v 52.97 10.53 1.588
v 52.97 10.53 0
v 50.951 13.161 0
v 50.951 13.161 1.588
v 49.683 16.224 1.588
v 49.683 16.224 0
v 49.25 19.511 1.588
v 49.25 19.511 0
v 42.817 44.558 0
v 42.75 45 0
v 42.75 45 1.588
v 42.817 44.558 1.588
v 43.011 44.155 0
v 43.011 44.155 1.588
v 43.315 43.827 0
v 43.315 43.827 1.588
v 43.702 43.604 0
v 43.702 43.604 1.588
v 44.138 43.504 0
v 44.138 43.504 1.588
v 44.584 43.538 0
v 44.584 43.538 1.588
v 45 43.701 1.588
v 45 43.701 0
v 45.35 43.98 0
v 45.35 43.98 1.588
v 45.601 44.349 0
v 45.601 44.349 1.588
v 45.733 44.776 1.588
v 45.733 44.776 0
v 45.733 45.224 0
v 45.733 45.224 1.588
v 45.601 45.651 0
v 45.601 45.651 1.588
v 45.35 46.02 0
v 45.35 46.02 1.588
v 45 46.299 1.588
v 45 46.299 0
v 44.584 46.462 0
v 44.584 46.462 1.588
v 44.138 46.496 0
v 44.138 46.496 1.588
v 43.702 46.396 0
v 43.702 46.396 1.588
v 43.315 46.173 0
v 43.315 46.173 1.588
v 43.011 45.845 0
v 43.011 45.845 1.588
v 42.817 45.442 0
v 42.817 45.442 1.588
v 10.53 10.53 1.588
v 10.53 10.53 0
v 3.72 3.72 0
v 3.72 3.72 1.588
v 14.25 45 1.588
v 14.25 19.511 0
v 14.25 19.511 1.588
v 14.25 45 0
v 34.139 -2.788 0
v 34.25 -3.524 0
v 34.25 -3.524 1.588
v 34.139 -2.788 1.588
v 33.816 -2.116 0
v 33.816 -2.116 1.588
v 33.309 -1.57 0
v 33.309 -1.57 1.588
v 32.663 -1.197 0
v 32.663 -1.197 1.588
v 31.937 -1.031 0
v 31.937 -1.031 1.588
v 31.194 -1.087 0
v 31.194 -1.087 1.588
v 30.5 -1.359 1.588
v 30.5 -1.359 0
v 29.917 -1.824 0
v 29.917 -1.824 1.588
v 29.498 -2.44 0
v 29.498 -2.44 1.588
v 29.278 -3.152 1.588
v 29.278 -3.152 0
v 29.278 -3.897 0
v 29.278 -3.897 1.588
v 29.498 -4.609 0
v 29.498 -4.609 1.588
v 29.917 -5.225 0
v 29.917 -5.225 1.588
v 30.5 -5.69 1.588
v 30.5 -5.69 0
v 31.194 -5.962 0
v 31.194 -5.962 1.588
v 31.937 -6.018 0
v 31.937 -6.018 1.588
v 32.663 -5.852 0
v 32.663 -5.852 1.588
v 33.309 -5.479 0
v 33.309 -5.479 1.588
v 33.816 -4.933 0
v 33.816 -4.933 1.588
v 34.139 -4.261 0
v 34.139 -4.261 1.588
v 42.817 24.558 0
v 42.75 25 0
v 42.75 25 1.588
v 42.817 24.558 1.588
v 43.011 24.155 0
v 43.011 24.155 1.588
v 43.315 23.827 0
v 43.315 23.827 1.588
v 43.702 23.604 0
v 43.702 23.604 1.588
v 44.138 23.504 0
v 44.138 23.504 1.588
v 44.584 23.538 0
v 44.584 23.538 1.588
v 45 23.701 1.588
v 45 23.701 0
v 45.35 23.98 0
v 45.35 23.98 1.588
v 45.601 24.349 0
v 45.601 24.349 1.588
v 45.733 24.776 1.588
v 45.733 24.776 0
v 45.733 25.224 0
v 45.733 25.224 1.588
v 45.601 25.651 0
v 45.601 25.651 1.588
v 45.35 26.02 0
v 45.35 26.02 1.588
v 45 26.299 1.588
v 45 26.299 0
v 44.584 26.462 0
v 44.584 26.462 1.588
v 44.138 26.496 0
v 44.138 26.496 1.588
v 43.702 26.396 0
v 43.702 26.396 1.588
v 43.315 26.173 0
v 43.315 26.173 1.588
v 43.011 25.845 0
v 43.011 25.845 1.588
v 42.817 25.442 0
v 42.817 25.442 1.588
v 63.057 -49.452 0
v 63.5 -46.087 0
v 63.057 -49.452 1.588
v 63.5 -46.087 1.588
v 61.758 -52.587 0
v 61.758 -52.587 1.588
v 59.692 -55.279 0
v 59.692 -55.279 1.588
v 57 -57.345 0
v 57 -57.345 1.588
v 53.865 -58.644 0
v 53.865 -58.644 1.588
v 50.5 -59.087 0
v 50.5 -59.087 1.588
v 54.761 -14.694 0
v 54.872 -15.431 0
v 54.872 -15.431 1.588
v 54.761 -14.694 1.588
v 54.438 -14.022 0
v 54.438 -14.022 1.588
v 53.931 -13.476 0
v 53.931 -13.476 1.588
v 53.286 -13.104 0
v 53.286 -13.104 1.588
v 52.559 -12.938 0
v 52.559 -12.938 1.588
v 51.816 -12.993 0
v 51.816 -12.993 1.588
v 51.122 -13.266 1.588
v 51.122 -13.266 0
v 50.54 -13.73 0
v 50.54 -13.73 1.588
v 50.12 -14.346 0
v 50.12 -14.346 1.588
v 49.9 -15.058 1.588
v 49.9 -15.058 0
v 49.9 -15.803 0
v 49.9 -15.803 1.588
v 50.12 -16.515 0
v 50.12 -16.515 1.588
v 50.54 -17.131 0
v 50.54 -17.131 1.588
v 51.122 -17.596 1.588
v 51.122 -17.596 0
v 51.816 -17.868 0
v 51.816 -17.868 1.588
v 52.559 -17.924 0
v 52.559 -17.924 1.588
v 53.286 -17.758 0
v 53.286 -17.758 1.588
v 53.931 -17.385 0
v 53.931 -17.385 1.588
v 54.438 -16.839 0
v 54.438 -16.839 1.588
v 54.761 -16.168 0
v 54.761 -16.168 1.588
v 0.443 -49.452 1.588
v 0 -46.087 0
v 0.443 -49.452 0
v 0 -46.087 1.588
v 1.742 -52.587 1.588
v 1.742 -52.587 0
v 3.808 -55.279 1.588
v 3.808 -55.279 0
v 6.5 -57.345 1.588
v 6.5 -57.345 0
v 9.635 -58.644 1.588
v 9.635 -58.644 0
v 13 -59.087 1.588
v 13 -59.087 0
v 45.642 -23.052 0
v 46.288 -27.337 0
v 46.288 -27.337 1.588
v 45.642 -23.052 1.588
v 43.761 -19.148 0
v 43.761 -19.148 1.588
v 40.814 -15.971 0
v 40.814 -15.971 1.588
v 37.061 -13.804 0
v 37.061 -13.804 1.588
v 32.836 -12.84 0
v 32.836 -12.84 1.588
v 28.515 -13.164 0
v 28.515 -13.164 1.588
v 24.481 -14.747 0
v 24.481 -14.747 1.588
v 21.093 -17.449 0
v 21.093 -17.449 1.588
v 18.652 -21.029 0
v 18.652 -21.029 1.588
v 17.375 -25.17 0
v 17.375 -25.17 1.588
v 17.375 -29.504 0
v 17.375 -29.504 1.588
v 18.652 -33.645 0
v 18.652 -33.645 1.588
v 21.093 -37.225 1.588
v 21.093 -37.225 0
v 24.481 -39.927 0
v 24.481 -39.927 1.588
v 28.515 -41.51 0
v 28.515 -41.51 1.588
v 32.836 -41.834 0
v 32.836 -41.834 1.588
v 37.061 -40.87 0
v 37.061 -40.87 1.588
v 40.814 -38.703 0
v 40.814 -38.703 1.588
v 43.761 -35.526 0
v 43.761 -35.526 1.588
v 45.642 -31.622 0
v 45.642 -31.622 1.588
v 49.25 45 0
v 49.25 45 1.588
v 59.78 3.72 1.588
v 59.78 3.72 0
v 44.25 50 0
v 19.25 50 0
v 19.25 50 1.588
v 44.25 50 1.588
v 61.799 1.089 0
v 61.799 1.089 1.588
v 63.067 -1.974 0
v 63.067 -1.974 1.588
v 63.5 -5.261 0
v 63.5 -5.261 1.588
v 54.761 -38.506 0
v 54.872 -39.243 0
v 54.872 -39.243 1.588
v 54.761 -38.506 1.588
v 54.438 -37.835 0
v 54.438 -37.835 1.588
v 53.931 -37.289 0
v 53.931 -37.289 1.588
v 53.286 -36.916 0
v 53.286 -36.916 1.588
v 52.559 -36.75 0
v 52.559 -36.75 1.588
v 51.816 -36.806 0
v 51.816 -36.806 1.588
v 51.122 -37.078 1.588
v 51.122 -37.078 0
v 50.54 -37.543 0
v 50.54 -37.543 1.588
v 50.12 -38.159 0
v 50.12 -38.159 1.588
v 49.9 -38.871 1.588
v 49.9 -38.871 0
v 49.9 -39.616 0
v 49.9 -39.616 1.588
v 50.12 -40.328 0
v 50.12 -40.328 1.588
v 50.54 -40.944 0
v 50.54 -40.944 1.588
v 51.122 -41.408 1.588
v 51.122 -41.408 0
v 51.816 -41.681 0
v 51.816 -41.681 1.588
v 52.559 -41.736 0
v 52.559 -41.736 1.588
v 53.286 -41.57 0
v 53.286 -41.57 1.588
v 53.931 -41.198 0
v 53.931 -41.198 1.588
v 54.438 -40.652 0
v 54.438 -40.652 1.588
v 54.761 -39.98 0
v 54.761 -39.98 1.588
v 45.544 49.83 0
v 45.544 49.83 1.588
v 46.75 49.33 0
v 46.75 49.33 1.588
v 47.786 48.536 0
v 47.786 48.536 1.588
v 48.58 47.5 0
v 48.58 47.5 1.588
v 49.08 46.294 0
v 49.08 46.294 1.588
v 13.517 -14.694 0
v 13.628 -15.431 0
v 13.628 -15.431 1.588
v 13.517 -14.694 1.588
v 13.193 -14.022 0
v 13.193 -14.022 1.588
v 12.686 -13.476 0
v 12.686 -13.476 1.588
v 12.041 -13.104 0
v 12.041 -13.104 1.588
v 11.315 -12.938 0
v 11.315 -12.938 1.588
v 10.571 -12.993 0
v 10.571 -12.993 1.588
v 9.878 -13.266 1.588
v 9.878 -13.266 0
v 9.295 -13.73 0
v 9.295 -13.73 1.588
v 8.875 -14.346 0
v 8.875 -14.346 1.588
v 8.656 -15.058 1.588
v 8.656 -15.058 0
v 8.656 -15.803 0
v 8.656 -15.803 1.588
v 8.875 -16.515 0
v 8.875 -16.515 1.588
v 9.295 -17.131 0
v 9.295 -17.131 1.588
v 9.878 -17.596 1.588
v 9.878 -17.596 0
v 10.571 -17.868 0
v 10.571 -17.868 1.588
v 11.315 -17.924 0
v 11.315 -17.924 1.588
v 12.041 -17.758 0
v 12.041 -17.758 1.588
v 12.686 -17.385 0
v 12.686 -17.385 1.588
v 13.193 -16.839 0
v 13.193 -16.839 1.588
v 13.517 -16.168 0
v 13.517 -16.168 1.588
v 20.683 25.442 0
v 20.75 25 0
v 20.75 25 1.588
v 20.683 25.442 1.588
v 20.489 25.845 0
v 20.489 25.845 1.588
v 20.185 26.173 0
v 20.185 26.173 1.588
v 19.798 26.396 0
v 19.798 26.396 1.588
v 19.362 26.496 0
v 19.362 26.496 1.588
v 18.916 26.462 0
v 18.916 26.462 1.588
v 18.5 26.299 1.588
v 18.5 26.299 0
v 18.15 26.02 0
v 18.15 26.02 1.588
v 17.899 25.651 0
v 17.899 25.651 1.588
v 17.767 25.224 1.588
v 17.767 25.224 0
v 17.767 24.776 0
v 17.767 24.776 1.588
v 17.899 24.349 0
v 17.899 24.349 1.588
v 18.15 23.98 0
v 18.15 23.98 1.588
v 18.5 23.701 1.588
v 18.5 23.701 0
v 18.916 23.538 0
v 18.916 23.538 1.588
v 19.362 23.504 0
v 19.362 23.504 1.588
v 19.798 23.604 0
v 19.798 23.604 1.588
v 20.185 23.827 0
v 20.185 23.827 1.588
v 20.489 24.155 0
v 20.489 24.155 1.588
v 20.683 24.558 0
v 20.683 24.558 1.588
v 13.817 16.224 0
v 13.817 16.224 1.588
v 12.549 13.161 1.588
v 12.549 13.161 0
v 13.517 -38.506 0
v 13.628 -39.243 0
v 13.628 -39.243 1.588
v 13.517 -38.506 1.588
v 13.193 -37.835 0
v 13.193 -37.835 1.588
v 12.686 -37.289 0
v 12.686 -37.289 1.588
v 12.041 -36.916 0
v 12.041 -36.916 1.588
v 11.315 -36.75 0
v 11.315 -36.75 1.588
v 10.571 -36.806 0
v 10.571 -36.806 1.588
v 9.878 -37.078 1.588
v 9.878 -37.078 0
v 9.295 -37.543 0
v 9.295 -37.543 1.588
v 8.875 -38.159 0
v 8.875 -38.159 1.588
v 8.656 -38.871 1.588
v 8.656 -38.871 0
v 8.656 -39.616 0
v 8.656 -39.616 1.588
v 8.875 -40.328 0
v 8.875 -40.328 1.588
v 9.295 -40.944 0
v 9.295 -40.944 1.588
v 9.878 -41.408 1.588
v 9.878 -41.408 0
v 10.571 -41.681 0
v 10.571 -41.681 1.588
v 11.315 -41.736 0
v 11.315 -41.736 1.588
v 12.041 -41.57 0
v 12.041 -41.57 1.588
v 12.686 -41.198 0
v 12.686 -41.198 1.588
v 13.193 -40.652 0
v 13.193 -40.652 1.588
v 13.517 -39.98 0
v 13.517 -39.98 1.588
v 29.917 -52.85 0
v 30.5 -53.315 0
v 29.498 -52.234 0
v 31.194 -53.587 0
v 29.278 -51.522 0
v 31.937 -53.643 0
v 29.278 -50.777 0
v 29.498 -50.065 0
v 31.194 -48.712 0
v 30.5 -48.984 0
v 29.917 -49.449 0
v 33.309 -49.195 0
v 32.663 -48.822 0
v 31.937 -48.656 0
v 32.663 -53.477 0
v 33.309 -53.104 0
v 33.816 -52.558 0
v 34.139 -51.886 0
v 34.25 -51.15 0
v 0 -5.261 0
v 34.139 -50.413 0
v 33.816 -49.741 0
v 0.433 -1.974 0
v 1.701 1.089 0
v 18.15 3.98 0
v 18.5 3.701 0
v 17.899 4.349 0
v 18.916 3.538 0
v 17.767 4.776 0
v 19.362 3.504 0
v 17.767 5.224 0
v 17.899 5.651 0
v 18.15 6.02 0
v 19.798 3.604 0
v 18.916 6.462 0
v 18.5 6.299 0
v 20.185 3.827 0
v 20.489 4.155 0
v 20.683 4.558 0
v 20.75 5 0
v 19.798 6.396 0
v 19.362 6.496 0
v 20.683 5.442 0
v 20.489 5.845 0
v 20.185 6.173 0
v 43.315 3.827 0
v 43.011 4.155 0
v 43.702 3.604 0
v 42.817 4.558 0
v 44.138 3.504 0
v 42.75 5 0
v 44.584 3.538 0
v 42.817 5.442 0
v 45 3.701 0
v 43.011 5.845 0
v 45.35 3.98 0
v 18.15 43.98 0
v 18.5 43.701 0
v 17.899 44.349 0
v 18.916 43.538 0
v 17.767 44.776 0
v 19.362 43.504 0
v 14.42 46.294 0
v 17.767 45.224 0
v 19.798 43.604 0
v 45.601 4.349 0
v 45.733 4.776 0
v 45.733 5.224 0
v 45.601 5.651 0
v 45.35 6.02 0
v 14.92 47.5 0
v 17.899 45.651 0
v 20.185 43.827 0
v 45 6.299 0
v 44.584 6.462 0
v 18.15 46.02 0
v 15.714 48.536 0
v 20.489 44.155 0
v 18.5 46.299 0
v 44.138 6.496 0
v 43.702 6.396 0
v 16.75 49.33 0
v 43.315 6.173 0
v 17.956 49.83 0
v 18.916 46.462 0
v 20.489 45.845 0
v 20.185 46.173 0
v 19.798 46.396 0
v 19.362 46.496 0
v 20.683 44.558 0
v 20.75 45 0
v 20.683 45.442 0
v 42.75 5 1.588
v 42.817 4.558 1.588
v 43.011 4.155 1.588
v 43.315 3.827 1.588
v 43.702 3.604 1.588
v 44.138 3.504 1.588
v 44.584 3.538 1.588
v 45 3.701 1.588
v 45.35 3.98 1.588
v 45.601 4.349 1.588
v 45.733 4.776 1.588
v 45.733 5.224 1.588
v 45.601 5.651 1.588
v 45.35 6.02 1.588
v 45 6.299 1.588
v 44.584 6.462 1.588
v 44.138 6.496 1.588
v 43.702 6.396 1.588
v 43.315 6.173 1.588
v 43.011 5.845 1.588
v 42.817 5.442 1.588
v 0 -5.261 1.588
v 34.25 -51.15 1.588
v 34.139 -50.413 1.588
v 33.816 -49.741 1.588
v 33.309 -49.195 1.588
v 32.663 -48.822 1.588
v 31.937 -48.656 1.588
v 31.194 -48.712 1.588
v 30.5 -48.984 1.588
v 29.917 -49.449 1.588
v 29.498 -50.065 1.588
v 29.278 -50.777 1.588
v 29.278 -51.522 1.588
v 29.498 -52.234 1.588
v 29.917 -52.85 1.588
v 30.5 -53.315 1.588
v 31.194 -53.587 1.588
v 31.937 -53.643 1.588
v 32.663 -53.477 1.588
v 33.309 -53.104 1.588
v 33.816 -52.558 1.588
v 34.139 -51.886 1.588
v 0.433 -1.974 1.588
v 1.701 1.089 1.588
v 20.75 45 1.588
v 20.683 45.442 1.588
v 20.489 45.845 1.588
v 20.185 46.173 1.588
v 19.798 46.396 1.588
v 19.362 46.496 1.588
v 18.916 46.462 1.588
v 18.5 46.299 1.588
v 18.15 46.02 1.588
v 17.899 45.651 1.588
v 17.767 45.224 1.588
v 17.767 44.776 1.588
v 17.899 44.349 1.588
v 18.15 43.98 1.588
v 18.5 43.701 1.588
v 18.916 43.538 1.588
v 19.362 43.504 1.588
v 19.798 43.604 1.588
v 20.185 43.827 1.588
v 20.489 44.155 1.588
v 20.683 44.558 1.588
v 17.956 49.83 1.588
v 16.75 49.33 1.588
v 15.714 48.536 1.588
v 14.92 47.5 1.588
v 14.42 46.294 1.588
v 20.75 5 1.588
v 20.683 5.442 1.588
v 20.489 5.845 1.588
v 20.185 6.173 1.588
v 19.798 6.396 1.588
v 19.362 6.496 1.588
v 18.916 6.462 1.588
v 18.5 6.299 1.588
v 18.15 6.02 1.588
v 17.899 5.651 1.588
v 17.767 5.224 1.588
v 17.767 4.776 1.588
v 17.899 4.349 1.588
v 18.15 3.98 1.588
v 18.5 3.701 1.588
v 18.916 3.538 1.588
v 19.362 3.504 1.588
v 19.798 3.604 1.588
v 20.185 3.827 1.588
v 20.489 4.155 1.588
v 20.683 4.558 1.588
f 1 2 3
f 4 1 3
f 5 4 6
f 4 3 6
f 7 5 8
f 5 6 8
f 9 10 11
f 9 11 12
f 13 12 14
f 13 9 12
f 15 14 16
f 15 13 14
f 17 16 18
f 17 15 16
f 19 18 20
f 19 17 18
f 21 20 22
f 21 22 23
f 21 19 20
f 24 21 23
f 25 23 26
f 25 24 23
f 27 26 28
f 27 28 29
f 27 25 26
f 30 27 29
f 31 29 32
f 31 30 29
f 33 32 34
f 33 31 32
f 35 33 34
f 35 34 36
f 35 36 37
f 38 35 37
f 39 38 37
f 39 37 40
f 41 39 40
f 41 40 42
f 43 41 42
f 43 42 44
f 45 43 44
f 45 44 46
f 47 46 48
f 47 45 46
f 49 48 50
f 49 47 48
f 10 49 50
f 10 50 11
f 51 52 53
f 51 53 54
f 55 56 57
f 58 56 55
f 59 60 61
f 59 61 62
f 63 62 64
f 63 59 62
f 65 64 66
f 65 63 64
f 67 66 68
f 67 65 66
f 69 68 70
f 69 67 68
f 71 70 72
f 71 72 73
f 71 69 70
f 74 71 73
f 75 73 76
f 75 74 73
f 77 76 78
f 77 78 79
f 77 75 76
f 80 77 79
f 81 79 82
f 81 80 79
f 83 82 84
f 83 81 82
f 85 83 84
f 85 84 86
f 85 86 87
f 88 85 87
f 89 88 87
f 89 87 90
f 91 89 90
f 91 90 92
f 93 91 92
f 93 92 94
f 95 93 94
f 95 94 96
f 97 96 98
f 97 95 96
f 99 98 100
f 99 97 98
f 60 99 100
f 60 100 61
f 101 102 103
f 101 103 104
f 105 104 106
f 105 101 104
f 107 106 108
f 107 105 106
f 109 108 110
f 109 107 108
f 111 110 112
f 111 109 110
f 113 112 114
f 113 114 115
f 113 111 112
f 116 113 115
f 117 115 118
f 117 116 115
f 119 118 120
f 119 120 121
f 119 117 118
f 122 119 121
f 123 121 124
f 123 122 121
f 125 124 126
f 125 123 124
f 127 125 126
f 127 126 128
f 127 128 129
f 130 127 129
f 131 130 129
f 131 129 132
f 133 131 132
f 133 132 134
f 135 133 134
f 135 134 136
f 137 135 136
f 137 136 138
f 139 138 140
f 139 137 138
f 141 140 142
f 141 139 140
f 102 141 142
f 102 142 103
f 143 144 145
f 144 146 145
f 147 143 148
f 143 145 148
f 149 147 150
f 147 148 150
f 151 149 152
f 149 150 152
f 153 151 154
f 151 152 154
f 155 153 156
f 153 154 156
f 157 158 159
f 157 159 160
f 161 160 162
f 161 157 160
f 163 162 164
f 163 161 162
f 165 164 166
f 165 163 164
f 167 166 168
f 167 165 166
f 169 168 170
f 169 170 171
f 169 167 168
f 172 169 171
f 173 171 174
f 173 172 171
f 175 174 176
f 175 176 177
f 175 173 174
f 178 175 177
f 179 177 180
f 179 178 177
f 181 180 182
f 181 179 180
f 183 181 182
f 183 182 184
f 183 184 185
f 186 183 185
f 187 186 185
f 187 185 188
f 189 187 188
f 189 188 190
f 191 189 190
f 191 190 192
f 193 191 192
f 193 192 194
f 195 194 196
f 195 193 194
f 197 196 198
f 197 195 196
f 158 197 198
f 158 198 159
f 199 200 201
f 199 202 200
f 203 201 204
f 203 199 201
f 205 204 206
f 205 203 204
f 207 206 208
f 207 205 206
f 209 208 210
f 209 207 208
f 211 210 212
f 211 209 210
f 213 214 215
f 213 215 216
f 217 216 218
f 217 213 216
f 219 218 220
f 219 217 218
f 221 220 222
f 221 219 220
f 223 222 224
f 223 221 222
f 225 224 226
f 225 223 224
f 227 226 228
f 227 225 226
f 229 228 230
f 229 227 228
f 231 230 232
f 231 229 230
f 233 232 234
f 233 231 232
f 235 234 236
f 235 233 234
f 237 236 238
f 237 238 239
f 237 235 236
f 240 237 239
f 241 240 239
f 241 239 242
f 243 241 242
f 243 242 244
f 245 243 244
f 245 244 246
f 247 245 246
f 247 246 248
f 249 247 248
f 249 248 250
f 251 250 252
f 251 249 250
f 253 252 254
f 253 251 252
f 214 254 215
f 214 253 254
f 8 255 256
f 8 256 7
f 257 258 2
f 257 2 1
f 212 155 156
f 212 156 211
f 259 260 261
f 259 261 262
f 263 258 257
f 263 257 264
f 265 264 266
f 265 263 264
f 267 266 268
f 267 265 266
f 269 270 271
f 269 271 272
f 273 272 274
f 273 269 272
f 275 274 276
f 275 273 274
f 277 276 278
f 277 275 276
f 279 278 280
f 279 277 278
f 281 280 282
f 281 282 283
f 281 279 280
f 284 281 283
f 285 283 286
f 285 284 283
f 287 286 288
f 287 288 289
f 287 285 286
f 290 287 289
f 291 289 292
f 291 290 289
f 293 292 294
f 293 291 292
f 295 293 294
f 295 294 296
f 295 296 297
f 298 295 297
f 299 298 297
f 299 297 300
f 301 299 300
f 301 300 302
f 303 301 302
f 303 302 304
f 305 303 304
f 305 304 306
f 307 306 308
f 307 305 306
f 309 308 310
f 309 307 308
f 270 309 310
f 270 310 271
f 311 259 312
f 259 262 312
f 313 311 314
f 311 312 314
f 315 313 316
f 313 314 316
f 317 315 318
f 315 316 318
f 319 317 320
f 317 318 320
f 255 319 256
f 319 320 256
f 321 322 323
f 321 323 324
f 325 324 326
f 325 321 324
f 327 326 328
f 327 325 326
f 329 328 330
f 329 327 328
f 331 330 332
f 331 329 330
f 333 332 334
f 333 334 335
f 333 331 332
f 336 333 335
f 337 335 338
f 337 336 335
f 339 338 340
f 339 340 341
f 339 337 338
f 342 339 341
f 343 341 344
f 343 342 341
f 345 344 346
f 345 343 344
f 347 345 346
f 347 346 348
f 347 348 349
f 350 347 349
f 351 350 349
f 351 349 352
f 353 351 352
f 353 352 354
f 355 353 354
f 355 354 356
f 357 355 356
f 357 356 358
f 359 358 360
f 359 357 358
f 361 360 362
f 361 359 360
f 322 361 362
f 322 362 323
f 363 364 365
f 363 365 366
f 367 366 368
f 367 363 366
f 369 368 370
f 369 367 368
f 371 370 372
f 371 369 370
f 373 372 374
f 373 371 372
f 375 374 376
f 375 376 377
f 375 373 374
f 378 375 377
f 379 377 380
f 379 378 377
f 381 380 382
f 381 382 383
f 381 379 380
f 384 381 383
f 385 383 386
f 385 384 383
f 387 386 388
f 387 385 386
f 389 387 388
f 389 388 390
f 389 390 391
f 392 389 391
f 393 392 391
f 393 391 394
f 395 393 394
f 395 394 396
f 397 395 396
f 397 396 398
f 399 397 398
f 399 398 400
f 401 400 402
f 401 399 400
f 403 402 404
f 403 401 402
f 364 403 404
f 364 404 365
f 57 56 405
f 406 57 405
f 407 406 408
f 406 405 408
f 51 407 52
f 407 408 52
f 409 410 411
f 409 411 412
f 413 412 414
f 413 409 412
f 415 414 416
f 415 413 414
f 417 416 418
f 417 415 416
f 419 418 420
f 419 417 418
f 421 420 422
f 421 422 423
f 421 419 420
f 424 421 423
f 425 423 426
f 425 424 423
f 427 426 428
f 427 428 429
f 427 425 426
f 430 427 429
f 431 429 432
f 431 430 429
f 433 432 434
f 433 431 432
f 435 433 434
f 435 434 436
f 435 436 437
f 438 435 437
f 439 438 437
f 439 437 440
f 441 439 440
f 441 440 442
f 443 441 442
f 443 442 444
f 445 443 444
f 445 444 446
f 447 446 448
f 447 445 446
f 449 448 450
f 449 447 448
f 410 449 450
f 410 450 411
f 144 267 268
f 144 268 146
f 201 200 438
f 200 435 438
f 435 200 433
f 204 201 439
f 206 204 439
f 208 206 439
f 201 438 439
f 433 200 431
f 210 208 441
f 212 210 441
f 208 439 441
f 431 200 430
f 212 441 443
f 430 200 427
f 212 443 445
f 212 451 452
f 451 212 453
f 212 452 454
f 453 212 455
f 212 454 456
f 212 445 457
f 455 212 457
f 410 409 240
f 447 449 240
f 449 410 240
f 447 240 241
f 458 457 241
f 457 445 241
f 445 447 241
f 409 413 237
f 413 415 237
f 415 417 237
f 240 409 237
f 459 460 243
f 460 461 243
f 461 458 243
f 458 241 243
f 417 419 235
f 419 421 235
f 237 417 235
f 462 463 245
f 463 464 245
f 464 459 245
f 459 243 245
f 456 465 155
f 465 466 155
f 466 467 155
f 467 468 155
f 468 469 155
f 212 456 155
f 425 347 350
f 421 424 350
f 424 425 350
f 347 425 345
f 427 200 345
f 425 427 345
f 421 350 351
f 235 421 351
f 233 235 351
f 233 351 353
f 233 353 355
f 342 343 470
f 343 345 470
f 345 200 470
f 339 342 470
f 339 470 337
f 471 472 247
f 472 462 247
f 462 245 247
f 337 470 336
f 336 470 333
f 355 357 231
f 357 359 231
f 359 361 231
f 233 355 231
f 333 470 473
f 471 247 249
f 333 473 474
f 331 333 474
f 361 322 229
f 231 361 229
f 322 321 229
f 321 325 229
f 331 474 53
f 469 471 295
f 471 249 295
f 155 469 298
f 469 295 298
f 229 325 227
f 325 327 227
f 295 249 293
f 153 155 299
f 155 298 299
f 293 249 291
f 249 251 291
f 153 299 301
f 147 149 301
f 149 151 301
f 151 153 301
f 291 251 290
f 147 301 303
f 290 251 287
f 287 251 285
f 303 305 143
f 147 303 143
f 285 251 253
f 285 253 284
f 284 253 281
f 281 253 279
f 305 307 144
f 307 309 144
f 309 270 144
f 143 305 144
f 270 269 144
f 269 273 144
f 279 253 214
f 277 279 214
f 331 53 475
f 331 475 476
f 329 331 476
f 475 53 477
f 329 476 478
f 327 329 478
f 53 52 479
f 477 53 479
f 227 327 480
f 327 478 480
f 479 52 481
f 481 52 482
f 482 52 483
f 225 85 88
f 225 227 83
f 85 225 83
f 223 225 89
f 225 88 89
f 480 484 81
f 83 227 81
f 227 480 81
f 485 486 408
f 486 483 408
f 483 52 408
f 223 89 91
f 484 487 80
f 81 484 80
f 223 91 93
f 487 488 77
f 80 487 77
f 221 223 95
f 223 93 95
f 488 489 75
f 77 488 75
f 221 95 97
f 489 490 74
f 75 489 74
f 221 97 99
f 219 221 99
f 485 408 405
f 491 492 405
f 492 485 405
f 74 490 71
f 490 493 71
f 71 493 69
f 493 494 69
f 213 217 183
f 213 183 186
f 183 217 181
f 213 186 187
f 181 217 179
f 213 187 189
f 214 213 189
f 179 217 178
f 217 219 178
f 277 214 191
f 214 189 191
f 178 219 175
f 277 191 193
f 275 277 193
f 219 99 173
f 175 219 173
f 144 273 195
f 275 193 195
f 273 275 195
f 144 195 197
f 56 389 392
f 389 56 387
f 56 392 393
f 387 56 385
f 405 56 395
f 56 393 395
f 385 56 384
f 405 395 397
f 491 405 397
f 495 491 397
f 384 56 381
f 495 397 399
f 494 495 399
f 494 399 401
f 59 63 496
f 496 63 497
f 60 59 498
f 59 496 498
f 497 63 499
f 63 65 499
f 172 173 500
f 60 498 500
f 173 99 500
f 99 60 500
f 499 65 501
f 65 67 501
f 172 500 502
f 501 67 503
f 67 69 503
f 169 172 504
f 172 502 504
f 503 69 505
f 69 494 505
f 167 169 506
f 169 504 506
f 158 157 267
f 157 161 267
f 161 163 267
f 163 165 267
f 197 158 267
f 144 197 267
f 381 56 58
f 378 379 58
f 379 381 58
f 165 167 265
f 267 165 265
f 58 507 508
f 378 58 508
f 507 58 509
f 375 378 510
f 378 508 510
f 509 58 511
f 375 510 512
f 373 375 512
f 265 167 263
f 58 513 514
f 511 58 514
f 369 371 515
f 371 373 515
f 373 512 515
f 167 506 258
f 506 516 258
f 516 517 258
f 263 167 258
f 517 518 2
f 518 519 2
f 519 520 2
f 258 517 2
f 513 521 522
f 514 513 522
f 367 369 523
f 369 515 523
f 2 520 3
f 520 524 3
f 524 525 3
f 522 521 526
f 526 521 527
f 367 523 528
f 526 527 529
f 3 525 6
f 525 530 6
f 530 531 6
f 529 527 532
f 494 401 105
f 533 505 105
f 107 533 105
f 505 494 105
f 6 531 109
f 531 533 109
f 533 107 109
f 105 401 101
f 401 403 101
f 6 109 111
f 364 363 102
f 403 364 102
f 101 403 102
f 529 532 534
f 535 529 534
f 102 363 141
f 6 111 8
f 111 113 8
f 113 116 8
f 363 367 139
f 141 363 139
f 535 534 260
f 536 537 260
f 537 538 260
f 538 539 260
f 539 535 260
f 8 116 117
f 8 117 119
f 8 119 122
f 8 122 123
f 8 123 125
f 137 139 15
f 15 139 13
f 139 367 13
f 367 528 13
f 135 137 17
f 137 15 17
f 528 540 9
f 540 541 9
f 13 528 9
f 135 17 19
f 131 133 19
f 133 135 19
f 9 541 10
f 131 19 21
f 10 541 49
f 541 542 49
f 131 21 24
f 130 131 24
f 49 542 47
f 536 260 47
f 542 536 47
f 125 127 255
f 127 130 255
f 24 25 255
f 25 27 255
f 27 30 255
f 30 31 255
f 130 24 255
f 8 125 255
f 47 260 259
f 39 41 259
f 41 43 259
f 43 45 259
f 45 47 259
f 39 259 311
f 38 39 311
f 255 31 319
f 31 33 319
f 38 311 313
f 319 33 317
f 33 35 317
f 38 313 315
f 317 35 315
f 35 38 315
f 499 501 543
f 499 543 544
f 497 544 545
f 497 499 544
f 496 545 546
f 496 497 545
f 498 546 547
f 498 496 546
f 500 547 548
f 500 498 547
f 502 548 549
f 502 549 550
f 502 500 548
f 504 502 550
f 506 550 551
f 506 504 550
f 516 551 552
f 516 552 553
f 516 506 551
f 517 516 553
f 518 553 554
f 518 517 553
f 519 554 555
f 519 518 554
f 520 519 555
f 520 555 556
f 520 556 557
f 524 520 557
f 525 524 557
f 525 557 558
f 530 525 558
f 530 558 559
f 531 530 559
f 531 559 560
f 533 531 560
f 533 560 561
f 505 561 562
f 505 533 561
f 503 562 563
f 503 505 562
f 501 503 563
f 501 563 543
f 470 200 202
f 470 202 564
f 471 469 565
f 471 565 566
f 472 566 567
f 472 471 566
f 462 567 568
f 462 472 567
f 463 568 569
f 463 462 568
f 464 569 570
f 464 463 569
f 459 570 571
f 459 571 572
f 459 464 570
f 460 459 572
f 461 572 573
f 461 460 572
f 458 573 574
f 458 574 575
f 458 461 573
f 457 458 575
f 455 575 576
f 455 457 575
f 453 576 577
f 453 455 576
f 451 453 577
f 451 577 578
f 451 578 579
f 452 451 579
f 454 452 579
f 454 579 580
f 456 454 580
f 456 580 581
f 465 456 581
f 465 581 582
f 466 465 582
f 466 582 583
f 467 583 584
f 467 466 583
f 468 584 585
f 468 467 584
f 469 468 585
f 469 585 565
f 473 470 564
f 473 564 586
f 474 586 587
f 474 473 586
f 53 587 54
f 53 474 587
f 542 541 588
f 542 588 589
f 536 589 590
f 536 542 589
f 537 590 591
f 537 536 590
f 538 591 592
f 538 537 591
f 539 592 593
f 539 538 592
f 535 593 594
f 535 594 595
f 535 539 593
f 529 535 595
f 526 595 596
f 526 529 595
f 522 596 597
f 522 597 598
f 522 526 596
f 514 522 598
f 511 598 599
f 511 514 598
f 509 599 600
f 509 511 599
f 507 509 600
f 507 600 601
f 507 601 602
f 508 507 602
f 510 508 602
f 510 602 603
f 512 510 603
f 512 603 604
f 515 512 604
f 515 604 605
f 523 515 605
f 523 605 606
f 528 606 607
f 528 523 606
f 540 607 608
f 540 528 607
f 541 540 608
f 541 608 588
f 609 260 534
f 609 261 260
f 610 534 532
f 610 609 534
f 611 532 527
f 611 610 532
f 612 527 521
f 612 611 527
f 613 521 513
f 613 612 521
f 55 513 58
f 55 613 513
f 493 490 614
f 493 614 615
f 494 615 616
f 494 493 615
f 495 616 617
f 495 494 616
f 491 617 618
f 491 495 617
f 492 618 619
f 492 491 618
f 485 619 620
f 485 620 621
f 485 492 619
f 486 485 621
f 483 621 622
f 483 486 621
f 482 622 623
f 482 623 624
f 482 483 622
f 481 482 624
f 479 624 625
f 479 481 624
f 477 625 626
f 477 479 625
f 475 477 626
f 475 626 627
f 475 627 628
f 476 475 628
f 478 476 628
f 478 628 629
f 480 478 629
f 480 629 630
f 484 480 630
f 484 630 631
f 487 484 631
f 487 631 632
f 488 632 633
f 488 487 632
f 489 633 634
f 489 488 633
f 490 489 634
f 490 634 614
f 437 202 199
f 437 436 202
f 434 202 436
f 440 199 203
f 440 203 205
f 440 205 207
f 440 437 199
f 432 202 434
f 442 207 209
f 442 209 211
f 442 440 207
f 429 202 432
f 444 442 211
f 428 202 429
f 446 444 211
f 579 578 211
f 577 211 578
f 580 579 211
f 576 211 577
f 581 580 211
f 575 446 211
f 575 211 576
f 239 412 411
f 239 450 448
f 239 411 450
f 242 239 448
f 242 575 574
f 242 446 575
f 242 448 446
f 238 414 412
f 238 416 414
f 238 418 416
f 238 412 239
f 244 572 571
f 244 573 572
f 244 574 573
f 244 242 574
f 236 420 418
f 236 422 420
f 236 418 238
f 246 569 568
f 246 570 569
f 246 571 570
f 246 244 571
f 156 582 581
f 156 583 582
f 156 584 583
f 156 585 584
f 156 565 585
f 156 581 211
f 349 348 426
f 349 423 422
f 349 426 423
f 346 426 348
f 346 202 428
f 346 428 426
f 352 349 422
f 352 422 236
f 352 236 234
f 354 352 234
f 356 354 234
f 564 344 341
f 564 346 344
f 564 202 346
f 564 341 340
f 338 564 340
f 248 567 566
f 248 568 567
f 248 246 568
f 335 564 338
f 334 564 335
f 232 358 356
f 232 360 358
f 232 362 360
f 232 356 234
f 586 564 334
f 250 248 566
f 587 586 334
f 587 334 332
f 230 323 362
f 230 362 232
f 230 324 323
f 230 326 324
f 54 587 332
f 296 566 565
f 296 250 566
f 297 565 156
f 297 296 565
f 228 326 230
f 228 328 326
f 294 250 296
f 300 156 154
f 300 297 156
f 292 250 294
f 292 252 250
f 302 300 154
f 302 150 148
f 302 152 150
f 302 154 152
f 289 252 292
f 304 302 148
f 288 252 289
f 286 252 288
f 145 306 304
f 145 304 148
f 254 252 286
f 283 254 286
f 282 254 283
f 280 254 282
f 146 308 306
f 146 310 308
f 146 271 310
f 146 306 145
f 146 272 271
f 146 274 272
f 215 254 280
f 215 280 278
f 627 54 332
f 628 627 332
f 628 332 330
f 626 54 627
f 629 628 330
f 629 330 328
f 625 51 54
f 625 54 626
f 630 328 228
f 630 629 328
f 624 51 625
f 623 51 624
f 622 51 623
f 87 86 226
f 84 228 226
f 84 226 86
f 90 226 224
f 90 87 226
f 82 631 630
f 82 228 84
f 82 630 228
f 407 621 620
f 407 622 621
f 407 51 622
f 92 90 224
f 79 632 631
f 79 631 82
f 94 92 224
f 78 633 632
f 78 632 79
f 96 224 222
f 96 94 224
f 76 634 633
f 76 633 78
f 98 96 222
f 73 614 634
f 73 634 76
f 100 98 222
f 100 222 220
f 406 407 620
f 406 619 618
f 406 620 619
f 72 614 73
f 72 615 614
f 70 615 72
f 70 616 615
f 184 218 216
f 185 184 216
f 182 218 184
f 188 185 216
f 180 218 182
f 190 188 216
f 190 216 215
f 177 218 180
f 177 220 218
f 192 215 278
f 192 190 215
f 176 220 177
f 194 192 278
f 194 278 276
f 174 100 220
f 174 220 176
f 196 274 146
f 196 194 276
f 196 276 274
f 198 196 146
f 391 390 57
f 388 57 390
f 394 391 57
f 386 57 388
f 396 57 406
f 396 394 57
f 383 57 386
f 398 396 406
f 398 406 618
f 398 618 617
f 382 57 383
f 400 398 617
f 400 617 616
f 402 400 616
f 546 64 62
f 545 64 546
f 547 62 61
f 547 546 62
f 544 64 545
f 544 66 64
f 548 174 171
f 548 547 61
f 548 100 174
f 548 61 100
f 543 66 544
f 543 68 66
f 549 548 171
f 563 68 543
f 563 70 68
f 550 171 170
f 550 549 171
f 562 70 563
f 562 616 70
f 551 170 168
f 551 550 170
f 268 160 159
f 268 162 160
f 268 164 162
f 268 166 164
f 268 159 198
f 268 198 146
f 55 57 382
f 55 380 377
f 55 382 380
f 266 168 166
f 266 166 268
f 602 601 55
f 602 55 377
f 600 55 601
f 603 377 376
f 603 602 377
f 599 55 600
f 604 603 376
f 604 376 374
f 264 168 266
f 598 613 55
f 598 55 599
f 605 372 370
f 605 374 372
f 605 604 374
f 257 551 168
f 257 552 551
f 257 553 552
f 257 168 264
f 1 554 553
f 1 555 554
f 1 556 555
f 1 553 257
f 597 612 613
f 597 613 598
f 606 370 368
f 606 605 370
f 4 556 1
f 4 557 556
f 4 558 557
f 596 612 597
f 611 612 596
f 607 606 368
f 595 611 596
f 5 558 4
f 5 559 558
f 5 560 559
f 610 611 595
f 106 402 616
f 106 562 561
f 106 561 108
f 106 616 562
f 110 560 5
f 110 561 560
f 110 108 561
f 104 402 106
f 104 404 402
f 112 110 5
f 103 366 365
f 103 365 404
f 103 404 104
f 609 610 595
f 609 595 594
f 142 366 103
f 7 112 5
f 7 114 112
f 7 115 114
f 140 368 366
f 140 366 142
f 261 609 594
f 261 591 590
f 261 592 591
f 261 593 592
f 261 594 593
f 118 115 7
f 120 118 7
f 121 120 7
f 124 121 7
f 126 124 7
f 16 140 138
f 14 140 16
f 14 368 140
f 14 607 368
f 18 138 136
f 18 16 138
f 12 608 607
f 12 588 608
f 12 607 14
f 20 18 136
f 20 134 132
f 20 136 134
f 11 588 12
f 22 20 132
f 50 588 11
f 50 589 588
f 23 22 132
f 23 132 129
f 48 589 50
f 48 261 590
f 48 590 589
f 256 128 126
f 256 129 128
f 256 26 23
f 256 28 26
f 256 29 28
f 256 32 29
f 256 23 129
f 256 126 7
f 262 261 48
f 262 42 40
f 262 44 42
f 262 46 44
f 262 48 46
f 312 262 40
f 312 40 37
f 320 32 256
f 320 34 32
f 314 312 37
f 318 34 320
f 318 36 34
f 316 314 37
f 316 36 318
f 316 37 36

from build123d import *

# Parameters (mm, degrees)
SKETCH1_R           = 14.5375
SKETCH1_R_2         = 1.5
SKETCH1_R_3         = 2.5
BOSS_EXTRUDE1_DEPTH = 1.5875
FILLET1_R           = 5
FILLET2_R           = 13
CHAMFER1_SIZE       = 14.249999948
FILLET4_START       = -1
FILLET4_DEPTH       = 4
FILLET4_2_DEPTH     = 1.5875


with BuildPart() as part:
    # Sketch1 → Boss-Extrude1 (new body)
    with BuildSketch(Plane.XY):
        Polygon((14.25, 50), (49.25, 50), (49.25, 0), (63.5, 0), (63.5, -59.087), (0, -59.087), (0, 0), (14.25, 0), align=None)
        with Locations((31.75, -27.337)):
            Circle(SKETCH1_R, mode=Mode.SUBTRACT)
        with Locations((19.25, 45)):
            Circle(SKETCH1_R_2, mode=Mode.SUBTRACT)
        with Locations((19.25, 25)):
            Circle(SKETCH1_R_2, mode=Mode.SUBTRACT)
        with Locations((19.25, 5)):
            Circle(SKETCH1_R_2, mode=Mode.SUBTRACT)
        with Locations(Location((44.25, 5, 0), (0, 0, 180))):
            Circle(SKETCH1_R_2, mode=Mode.SUBTRACT)
        with Locations(Location((44.25, 25, 0), (0, 0, 180))):
            Circle(SKETCH1_R_2, mode=Mode.SUBTRACT)
        with Locations(Location((44.25, 45, 0), (0, 0, 180))):
            Circle(SKETCH1_R_2, mode=Mode.SUBTRACT)
        with Locations((31.75, -51.1495)):
            Circle(SKETCH1_R_3, mode=Mode.SUBTRACT)
        with Locations((11.127770072, -39.24325)):
            Circle(SKETCH1_R_3, mode=Mode.SUBTRACT)
        with Locations((11.127770072, -15.43075)):
            Circle(SKETCH1_R_3, mode=Mode.SUBTRACT)
        with Locations((31.75, -3.5245)):
            Circle(SKETCH1_R_3, mode=Mode.SUBTRACT)
        with Locations((52.372229928, -15.43075)):
            Circle(SKETCH1_R_3, mode=Mode.SUBTRACT)
        with Locations((52.372229928, -39.24325)):
            Circle(SKETCH1_R_3, mode=Mode.SUBTRACT)
    extrude(amount=BOSS_EXTRUDE1_DEPTH)

    # Fillet1
    fillet1_edges = [part.edges().sort_by_distance(p)[0] for p in [
        (14.25, 50, 0.79375),
        (49.25, 50, 0.79375),
    ]]
    fillet(fillet1_edges, radius=FILLET1_R)

    # Fillet2
    fillet2_edges = [part.edges().sort_by_distance(p)[0] for p in [
        (63.5, -59.087, 0.79375),
        (0, -59.087, 0.79375),
    ]]
    fillet(fillet2_edges, radius=FILLET2_R)

    # Chamfer1
    chamfer1_edges = [part.edges().sort_by_distance(p)[0] for p in [
        (49.25, 0, 0.79375),
        (14.25, 0, 0.79375),
    ]]
    chamfer(chamfer1_edges, length=CHAMFER1_SIZE)

    # Fillet4: read off the stored shape, not the designer's step
    # Fillet4 outline → Fillet4 (cut)
    with BuildSketch(Plane.XY.offset(FILLET4_START)):
        with BuildLine():
            ThreePointArc((0, -5.260512294), (0.966729937, -0.400432703), (3.719743879, 3.719743827))
            Line((3.719743879, 3.719743827), (2.6e-08, -2.6e-08))
            Line((2.6e-08, -2.6e-08), (0, -5.260512294))
        make_face()
        with BuildLine():
            Line((63.499999974, -2.6e-08), (59.780256121, 3.719743827))
            ThreePointArc((59.780256121, 3.719743827), (62.533270063, -0.400432703), (63.5, -5.260512294))
            Line((63.5, -5.260512294), (63.499999974, -2.6e-08))
        make_face()
    extrude(amount=FILLET4_DEPTH, mode=Mode.SUBTRACT)

    # Fillet4 2 outline → Fillet4 2 (add)
    with BuildSketch(Plane.XY):
        with BuildLine():
            ThreePointArc((14.25, 19.51051219), (13.283270063, 14.650432599), (10.530256121, 10.530256069))
            Line((10.530256121, 10.530256069), (14.25, 14.249999948))
            Line((14.25, 14.249999948), (14.25, 19.51051219))
        make_face()
        with BuildLine():
            Line((49.25, 14.249999948), (52.969743879, 10.530256069))
            ThreePointArc((52.969743879, 10.530256069), (50.216729937, 14.650432599), (49.25, 19.51051219))
            Line((49.25, 19.51051219), (49.25, 14.249999948))
        make_face()
    extrude(amount=FILLET4_2_DEPTH)


solid = part.part
